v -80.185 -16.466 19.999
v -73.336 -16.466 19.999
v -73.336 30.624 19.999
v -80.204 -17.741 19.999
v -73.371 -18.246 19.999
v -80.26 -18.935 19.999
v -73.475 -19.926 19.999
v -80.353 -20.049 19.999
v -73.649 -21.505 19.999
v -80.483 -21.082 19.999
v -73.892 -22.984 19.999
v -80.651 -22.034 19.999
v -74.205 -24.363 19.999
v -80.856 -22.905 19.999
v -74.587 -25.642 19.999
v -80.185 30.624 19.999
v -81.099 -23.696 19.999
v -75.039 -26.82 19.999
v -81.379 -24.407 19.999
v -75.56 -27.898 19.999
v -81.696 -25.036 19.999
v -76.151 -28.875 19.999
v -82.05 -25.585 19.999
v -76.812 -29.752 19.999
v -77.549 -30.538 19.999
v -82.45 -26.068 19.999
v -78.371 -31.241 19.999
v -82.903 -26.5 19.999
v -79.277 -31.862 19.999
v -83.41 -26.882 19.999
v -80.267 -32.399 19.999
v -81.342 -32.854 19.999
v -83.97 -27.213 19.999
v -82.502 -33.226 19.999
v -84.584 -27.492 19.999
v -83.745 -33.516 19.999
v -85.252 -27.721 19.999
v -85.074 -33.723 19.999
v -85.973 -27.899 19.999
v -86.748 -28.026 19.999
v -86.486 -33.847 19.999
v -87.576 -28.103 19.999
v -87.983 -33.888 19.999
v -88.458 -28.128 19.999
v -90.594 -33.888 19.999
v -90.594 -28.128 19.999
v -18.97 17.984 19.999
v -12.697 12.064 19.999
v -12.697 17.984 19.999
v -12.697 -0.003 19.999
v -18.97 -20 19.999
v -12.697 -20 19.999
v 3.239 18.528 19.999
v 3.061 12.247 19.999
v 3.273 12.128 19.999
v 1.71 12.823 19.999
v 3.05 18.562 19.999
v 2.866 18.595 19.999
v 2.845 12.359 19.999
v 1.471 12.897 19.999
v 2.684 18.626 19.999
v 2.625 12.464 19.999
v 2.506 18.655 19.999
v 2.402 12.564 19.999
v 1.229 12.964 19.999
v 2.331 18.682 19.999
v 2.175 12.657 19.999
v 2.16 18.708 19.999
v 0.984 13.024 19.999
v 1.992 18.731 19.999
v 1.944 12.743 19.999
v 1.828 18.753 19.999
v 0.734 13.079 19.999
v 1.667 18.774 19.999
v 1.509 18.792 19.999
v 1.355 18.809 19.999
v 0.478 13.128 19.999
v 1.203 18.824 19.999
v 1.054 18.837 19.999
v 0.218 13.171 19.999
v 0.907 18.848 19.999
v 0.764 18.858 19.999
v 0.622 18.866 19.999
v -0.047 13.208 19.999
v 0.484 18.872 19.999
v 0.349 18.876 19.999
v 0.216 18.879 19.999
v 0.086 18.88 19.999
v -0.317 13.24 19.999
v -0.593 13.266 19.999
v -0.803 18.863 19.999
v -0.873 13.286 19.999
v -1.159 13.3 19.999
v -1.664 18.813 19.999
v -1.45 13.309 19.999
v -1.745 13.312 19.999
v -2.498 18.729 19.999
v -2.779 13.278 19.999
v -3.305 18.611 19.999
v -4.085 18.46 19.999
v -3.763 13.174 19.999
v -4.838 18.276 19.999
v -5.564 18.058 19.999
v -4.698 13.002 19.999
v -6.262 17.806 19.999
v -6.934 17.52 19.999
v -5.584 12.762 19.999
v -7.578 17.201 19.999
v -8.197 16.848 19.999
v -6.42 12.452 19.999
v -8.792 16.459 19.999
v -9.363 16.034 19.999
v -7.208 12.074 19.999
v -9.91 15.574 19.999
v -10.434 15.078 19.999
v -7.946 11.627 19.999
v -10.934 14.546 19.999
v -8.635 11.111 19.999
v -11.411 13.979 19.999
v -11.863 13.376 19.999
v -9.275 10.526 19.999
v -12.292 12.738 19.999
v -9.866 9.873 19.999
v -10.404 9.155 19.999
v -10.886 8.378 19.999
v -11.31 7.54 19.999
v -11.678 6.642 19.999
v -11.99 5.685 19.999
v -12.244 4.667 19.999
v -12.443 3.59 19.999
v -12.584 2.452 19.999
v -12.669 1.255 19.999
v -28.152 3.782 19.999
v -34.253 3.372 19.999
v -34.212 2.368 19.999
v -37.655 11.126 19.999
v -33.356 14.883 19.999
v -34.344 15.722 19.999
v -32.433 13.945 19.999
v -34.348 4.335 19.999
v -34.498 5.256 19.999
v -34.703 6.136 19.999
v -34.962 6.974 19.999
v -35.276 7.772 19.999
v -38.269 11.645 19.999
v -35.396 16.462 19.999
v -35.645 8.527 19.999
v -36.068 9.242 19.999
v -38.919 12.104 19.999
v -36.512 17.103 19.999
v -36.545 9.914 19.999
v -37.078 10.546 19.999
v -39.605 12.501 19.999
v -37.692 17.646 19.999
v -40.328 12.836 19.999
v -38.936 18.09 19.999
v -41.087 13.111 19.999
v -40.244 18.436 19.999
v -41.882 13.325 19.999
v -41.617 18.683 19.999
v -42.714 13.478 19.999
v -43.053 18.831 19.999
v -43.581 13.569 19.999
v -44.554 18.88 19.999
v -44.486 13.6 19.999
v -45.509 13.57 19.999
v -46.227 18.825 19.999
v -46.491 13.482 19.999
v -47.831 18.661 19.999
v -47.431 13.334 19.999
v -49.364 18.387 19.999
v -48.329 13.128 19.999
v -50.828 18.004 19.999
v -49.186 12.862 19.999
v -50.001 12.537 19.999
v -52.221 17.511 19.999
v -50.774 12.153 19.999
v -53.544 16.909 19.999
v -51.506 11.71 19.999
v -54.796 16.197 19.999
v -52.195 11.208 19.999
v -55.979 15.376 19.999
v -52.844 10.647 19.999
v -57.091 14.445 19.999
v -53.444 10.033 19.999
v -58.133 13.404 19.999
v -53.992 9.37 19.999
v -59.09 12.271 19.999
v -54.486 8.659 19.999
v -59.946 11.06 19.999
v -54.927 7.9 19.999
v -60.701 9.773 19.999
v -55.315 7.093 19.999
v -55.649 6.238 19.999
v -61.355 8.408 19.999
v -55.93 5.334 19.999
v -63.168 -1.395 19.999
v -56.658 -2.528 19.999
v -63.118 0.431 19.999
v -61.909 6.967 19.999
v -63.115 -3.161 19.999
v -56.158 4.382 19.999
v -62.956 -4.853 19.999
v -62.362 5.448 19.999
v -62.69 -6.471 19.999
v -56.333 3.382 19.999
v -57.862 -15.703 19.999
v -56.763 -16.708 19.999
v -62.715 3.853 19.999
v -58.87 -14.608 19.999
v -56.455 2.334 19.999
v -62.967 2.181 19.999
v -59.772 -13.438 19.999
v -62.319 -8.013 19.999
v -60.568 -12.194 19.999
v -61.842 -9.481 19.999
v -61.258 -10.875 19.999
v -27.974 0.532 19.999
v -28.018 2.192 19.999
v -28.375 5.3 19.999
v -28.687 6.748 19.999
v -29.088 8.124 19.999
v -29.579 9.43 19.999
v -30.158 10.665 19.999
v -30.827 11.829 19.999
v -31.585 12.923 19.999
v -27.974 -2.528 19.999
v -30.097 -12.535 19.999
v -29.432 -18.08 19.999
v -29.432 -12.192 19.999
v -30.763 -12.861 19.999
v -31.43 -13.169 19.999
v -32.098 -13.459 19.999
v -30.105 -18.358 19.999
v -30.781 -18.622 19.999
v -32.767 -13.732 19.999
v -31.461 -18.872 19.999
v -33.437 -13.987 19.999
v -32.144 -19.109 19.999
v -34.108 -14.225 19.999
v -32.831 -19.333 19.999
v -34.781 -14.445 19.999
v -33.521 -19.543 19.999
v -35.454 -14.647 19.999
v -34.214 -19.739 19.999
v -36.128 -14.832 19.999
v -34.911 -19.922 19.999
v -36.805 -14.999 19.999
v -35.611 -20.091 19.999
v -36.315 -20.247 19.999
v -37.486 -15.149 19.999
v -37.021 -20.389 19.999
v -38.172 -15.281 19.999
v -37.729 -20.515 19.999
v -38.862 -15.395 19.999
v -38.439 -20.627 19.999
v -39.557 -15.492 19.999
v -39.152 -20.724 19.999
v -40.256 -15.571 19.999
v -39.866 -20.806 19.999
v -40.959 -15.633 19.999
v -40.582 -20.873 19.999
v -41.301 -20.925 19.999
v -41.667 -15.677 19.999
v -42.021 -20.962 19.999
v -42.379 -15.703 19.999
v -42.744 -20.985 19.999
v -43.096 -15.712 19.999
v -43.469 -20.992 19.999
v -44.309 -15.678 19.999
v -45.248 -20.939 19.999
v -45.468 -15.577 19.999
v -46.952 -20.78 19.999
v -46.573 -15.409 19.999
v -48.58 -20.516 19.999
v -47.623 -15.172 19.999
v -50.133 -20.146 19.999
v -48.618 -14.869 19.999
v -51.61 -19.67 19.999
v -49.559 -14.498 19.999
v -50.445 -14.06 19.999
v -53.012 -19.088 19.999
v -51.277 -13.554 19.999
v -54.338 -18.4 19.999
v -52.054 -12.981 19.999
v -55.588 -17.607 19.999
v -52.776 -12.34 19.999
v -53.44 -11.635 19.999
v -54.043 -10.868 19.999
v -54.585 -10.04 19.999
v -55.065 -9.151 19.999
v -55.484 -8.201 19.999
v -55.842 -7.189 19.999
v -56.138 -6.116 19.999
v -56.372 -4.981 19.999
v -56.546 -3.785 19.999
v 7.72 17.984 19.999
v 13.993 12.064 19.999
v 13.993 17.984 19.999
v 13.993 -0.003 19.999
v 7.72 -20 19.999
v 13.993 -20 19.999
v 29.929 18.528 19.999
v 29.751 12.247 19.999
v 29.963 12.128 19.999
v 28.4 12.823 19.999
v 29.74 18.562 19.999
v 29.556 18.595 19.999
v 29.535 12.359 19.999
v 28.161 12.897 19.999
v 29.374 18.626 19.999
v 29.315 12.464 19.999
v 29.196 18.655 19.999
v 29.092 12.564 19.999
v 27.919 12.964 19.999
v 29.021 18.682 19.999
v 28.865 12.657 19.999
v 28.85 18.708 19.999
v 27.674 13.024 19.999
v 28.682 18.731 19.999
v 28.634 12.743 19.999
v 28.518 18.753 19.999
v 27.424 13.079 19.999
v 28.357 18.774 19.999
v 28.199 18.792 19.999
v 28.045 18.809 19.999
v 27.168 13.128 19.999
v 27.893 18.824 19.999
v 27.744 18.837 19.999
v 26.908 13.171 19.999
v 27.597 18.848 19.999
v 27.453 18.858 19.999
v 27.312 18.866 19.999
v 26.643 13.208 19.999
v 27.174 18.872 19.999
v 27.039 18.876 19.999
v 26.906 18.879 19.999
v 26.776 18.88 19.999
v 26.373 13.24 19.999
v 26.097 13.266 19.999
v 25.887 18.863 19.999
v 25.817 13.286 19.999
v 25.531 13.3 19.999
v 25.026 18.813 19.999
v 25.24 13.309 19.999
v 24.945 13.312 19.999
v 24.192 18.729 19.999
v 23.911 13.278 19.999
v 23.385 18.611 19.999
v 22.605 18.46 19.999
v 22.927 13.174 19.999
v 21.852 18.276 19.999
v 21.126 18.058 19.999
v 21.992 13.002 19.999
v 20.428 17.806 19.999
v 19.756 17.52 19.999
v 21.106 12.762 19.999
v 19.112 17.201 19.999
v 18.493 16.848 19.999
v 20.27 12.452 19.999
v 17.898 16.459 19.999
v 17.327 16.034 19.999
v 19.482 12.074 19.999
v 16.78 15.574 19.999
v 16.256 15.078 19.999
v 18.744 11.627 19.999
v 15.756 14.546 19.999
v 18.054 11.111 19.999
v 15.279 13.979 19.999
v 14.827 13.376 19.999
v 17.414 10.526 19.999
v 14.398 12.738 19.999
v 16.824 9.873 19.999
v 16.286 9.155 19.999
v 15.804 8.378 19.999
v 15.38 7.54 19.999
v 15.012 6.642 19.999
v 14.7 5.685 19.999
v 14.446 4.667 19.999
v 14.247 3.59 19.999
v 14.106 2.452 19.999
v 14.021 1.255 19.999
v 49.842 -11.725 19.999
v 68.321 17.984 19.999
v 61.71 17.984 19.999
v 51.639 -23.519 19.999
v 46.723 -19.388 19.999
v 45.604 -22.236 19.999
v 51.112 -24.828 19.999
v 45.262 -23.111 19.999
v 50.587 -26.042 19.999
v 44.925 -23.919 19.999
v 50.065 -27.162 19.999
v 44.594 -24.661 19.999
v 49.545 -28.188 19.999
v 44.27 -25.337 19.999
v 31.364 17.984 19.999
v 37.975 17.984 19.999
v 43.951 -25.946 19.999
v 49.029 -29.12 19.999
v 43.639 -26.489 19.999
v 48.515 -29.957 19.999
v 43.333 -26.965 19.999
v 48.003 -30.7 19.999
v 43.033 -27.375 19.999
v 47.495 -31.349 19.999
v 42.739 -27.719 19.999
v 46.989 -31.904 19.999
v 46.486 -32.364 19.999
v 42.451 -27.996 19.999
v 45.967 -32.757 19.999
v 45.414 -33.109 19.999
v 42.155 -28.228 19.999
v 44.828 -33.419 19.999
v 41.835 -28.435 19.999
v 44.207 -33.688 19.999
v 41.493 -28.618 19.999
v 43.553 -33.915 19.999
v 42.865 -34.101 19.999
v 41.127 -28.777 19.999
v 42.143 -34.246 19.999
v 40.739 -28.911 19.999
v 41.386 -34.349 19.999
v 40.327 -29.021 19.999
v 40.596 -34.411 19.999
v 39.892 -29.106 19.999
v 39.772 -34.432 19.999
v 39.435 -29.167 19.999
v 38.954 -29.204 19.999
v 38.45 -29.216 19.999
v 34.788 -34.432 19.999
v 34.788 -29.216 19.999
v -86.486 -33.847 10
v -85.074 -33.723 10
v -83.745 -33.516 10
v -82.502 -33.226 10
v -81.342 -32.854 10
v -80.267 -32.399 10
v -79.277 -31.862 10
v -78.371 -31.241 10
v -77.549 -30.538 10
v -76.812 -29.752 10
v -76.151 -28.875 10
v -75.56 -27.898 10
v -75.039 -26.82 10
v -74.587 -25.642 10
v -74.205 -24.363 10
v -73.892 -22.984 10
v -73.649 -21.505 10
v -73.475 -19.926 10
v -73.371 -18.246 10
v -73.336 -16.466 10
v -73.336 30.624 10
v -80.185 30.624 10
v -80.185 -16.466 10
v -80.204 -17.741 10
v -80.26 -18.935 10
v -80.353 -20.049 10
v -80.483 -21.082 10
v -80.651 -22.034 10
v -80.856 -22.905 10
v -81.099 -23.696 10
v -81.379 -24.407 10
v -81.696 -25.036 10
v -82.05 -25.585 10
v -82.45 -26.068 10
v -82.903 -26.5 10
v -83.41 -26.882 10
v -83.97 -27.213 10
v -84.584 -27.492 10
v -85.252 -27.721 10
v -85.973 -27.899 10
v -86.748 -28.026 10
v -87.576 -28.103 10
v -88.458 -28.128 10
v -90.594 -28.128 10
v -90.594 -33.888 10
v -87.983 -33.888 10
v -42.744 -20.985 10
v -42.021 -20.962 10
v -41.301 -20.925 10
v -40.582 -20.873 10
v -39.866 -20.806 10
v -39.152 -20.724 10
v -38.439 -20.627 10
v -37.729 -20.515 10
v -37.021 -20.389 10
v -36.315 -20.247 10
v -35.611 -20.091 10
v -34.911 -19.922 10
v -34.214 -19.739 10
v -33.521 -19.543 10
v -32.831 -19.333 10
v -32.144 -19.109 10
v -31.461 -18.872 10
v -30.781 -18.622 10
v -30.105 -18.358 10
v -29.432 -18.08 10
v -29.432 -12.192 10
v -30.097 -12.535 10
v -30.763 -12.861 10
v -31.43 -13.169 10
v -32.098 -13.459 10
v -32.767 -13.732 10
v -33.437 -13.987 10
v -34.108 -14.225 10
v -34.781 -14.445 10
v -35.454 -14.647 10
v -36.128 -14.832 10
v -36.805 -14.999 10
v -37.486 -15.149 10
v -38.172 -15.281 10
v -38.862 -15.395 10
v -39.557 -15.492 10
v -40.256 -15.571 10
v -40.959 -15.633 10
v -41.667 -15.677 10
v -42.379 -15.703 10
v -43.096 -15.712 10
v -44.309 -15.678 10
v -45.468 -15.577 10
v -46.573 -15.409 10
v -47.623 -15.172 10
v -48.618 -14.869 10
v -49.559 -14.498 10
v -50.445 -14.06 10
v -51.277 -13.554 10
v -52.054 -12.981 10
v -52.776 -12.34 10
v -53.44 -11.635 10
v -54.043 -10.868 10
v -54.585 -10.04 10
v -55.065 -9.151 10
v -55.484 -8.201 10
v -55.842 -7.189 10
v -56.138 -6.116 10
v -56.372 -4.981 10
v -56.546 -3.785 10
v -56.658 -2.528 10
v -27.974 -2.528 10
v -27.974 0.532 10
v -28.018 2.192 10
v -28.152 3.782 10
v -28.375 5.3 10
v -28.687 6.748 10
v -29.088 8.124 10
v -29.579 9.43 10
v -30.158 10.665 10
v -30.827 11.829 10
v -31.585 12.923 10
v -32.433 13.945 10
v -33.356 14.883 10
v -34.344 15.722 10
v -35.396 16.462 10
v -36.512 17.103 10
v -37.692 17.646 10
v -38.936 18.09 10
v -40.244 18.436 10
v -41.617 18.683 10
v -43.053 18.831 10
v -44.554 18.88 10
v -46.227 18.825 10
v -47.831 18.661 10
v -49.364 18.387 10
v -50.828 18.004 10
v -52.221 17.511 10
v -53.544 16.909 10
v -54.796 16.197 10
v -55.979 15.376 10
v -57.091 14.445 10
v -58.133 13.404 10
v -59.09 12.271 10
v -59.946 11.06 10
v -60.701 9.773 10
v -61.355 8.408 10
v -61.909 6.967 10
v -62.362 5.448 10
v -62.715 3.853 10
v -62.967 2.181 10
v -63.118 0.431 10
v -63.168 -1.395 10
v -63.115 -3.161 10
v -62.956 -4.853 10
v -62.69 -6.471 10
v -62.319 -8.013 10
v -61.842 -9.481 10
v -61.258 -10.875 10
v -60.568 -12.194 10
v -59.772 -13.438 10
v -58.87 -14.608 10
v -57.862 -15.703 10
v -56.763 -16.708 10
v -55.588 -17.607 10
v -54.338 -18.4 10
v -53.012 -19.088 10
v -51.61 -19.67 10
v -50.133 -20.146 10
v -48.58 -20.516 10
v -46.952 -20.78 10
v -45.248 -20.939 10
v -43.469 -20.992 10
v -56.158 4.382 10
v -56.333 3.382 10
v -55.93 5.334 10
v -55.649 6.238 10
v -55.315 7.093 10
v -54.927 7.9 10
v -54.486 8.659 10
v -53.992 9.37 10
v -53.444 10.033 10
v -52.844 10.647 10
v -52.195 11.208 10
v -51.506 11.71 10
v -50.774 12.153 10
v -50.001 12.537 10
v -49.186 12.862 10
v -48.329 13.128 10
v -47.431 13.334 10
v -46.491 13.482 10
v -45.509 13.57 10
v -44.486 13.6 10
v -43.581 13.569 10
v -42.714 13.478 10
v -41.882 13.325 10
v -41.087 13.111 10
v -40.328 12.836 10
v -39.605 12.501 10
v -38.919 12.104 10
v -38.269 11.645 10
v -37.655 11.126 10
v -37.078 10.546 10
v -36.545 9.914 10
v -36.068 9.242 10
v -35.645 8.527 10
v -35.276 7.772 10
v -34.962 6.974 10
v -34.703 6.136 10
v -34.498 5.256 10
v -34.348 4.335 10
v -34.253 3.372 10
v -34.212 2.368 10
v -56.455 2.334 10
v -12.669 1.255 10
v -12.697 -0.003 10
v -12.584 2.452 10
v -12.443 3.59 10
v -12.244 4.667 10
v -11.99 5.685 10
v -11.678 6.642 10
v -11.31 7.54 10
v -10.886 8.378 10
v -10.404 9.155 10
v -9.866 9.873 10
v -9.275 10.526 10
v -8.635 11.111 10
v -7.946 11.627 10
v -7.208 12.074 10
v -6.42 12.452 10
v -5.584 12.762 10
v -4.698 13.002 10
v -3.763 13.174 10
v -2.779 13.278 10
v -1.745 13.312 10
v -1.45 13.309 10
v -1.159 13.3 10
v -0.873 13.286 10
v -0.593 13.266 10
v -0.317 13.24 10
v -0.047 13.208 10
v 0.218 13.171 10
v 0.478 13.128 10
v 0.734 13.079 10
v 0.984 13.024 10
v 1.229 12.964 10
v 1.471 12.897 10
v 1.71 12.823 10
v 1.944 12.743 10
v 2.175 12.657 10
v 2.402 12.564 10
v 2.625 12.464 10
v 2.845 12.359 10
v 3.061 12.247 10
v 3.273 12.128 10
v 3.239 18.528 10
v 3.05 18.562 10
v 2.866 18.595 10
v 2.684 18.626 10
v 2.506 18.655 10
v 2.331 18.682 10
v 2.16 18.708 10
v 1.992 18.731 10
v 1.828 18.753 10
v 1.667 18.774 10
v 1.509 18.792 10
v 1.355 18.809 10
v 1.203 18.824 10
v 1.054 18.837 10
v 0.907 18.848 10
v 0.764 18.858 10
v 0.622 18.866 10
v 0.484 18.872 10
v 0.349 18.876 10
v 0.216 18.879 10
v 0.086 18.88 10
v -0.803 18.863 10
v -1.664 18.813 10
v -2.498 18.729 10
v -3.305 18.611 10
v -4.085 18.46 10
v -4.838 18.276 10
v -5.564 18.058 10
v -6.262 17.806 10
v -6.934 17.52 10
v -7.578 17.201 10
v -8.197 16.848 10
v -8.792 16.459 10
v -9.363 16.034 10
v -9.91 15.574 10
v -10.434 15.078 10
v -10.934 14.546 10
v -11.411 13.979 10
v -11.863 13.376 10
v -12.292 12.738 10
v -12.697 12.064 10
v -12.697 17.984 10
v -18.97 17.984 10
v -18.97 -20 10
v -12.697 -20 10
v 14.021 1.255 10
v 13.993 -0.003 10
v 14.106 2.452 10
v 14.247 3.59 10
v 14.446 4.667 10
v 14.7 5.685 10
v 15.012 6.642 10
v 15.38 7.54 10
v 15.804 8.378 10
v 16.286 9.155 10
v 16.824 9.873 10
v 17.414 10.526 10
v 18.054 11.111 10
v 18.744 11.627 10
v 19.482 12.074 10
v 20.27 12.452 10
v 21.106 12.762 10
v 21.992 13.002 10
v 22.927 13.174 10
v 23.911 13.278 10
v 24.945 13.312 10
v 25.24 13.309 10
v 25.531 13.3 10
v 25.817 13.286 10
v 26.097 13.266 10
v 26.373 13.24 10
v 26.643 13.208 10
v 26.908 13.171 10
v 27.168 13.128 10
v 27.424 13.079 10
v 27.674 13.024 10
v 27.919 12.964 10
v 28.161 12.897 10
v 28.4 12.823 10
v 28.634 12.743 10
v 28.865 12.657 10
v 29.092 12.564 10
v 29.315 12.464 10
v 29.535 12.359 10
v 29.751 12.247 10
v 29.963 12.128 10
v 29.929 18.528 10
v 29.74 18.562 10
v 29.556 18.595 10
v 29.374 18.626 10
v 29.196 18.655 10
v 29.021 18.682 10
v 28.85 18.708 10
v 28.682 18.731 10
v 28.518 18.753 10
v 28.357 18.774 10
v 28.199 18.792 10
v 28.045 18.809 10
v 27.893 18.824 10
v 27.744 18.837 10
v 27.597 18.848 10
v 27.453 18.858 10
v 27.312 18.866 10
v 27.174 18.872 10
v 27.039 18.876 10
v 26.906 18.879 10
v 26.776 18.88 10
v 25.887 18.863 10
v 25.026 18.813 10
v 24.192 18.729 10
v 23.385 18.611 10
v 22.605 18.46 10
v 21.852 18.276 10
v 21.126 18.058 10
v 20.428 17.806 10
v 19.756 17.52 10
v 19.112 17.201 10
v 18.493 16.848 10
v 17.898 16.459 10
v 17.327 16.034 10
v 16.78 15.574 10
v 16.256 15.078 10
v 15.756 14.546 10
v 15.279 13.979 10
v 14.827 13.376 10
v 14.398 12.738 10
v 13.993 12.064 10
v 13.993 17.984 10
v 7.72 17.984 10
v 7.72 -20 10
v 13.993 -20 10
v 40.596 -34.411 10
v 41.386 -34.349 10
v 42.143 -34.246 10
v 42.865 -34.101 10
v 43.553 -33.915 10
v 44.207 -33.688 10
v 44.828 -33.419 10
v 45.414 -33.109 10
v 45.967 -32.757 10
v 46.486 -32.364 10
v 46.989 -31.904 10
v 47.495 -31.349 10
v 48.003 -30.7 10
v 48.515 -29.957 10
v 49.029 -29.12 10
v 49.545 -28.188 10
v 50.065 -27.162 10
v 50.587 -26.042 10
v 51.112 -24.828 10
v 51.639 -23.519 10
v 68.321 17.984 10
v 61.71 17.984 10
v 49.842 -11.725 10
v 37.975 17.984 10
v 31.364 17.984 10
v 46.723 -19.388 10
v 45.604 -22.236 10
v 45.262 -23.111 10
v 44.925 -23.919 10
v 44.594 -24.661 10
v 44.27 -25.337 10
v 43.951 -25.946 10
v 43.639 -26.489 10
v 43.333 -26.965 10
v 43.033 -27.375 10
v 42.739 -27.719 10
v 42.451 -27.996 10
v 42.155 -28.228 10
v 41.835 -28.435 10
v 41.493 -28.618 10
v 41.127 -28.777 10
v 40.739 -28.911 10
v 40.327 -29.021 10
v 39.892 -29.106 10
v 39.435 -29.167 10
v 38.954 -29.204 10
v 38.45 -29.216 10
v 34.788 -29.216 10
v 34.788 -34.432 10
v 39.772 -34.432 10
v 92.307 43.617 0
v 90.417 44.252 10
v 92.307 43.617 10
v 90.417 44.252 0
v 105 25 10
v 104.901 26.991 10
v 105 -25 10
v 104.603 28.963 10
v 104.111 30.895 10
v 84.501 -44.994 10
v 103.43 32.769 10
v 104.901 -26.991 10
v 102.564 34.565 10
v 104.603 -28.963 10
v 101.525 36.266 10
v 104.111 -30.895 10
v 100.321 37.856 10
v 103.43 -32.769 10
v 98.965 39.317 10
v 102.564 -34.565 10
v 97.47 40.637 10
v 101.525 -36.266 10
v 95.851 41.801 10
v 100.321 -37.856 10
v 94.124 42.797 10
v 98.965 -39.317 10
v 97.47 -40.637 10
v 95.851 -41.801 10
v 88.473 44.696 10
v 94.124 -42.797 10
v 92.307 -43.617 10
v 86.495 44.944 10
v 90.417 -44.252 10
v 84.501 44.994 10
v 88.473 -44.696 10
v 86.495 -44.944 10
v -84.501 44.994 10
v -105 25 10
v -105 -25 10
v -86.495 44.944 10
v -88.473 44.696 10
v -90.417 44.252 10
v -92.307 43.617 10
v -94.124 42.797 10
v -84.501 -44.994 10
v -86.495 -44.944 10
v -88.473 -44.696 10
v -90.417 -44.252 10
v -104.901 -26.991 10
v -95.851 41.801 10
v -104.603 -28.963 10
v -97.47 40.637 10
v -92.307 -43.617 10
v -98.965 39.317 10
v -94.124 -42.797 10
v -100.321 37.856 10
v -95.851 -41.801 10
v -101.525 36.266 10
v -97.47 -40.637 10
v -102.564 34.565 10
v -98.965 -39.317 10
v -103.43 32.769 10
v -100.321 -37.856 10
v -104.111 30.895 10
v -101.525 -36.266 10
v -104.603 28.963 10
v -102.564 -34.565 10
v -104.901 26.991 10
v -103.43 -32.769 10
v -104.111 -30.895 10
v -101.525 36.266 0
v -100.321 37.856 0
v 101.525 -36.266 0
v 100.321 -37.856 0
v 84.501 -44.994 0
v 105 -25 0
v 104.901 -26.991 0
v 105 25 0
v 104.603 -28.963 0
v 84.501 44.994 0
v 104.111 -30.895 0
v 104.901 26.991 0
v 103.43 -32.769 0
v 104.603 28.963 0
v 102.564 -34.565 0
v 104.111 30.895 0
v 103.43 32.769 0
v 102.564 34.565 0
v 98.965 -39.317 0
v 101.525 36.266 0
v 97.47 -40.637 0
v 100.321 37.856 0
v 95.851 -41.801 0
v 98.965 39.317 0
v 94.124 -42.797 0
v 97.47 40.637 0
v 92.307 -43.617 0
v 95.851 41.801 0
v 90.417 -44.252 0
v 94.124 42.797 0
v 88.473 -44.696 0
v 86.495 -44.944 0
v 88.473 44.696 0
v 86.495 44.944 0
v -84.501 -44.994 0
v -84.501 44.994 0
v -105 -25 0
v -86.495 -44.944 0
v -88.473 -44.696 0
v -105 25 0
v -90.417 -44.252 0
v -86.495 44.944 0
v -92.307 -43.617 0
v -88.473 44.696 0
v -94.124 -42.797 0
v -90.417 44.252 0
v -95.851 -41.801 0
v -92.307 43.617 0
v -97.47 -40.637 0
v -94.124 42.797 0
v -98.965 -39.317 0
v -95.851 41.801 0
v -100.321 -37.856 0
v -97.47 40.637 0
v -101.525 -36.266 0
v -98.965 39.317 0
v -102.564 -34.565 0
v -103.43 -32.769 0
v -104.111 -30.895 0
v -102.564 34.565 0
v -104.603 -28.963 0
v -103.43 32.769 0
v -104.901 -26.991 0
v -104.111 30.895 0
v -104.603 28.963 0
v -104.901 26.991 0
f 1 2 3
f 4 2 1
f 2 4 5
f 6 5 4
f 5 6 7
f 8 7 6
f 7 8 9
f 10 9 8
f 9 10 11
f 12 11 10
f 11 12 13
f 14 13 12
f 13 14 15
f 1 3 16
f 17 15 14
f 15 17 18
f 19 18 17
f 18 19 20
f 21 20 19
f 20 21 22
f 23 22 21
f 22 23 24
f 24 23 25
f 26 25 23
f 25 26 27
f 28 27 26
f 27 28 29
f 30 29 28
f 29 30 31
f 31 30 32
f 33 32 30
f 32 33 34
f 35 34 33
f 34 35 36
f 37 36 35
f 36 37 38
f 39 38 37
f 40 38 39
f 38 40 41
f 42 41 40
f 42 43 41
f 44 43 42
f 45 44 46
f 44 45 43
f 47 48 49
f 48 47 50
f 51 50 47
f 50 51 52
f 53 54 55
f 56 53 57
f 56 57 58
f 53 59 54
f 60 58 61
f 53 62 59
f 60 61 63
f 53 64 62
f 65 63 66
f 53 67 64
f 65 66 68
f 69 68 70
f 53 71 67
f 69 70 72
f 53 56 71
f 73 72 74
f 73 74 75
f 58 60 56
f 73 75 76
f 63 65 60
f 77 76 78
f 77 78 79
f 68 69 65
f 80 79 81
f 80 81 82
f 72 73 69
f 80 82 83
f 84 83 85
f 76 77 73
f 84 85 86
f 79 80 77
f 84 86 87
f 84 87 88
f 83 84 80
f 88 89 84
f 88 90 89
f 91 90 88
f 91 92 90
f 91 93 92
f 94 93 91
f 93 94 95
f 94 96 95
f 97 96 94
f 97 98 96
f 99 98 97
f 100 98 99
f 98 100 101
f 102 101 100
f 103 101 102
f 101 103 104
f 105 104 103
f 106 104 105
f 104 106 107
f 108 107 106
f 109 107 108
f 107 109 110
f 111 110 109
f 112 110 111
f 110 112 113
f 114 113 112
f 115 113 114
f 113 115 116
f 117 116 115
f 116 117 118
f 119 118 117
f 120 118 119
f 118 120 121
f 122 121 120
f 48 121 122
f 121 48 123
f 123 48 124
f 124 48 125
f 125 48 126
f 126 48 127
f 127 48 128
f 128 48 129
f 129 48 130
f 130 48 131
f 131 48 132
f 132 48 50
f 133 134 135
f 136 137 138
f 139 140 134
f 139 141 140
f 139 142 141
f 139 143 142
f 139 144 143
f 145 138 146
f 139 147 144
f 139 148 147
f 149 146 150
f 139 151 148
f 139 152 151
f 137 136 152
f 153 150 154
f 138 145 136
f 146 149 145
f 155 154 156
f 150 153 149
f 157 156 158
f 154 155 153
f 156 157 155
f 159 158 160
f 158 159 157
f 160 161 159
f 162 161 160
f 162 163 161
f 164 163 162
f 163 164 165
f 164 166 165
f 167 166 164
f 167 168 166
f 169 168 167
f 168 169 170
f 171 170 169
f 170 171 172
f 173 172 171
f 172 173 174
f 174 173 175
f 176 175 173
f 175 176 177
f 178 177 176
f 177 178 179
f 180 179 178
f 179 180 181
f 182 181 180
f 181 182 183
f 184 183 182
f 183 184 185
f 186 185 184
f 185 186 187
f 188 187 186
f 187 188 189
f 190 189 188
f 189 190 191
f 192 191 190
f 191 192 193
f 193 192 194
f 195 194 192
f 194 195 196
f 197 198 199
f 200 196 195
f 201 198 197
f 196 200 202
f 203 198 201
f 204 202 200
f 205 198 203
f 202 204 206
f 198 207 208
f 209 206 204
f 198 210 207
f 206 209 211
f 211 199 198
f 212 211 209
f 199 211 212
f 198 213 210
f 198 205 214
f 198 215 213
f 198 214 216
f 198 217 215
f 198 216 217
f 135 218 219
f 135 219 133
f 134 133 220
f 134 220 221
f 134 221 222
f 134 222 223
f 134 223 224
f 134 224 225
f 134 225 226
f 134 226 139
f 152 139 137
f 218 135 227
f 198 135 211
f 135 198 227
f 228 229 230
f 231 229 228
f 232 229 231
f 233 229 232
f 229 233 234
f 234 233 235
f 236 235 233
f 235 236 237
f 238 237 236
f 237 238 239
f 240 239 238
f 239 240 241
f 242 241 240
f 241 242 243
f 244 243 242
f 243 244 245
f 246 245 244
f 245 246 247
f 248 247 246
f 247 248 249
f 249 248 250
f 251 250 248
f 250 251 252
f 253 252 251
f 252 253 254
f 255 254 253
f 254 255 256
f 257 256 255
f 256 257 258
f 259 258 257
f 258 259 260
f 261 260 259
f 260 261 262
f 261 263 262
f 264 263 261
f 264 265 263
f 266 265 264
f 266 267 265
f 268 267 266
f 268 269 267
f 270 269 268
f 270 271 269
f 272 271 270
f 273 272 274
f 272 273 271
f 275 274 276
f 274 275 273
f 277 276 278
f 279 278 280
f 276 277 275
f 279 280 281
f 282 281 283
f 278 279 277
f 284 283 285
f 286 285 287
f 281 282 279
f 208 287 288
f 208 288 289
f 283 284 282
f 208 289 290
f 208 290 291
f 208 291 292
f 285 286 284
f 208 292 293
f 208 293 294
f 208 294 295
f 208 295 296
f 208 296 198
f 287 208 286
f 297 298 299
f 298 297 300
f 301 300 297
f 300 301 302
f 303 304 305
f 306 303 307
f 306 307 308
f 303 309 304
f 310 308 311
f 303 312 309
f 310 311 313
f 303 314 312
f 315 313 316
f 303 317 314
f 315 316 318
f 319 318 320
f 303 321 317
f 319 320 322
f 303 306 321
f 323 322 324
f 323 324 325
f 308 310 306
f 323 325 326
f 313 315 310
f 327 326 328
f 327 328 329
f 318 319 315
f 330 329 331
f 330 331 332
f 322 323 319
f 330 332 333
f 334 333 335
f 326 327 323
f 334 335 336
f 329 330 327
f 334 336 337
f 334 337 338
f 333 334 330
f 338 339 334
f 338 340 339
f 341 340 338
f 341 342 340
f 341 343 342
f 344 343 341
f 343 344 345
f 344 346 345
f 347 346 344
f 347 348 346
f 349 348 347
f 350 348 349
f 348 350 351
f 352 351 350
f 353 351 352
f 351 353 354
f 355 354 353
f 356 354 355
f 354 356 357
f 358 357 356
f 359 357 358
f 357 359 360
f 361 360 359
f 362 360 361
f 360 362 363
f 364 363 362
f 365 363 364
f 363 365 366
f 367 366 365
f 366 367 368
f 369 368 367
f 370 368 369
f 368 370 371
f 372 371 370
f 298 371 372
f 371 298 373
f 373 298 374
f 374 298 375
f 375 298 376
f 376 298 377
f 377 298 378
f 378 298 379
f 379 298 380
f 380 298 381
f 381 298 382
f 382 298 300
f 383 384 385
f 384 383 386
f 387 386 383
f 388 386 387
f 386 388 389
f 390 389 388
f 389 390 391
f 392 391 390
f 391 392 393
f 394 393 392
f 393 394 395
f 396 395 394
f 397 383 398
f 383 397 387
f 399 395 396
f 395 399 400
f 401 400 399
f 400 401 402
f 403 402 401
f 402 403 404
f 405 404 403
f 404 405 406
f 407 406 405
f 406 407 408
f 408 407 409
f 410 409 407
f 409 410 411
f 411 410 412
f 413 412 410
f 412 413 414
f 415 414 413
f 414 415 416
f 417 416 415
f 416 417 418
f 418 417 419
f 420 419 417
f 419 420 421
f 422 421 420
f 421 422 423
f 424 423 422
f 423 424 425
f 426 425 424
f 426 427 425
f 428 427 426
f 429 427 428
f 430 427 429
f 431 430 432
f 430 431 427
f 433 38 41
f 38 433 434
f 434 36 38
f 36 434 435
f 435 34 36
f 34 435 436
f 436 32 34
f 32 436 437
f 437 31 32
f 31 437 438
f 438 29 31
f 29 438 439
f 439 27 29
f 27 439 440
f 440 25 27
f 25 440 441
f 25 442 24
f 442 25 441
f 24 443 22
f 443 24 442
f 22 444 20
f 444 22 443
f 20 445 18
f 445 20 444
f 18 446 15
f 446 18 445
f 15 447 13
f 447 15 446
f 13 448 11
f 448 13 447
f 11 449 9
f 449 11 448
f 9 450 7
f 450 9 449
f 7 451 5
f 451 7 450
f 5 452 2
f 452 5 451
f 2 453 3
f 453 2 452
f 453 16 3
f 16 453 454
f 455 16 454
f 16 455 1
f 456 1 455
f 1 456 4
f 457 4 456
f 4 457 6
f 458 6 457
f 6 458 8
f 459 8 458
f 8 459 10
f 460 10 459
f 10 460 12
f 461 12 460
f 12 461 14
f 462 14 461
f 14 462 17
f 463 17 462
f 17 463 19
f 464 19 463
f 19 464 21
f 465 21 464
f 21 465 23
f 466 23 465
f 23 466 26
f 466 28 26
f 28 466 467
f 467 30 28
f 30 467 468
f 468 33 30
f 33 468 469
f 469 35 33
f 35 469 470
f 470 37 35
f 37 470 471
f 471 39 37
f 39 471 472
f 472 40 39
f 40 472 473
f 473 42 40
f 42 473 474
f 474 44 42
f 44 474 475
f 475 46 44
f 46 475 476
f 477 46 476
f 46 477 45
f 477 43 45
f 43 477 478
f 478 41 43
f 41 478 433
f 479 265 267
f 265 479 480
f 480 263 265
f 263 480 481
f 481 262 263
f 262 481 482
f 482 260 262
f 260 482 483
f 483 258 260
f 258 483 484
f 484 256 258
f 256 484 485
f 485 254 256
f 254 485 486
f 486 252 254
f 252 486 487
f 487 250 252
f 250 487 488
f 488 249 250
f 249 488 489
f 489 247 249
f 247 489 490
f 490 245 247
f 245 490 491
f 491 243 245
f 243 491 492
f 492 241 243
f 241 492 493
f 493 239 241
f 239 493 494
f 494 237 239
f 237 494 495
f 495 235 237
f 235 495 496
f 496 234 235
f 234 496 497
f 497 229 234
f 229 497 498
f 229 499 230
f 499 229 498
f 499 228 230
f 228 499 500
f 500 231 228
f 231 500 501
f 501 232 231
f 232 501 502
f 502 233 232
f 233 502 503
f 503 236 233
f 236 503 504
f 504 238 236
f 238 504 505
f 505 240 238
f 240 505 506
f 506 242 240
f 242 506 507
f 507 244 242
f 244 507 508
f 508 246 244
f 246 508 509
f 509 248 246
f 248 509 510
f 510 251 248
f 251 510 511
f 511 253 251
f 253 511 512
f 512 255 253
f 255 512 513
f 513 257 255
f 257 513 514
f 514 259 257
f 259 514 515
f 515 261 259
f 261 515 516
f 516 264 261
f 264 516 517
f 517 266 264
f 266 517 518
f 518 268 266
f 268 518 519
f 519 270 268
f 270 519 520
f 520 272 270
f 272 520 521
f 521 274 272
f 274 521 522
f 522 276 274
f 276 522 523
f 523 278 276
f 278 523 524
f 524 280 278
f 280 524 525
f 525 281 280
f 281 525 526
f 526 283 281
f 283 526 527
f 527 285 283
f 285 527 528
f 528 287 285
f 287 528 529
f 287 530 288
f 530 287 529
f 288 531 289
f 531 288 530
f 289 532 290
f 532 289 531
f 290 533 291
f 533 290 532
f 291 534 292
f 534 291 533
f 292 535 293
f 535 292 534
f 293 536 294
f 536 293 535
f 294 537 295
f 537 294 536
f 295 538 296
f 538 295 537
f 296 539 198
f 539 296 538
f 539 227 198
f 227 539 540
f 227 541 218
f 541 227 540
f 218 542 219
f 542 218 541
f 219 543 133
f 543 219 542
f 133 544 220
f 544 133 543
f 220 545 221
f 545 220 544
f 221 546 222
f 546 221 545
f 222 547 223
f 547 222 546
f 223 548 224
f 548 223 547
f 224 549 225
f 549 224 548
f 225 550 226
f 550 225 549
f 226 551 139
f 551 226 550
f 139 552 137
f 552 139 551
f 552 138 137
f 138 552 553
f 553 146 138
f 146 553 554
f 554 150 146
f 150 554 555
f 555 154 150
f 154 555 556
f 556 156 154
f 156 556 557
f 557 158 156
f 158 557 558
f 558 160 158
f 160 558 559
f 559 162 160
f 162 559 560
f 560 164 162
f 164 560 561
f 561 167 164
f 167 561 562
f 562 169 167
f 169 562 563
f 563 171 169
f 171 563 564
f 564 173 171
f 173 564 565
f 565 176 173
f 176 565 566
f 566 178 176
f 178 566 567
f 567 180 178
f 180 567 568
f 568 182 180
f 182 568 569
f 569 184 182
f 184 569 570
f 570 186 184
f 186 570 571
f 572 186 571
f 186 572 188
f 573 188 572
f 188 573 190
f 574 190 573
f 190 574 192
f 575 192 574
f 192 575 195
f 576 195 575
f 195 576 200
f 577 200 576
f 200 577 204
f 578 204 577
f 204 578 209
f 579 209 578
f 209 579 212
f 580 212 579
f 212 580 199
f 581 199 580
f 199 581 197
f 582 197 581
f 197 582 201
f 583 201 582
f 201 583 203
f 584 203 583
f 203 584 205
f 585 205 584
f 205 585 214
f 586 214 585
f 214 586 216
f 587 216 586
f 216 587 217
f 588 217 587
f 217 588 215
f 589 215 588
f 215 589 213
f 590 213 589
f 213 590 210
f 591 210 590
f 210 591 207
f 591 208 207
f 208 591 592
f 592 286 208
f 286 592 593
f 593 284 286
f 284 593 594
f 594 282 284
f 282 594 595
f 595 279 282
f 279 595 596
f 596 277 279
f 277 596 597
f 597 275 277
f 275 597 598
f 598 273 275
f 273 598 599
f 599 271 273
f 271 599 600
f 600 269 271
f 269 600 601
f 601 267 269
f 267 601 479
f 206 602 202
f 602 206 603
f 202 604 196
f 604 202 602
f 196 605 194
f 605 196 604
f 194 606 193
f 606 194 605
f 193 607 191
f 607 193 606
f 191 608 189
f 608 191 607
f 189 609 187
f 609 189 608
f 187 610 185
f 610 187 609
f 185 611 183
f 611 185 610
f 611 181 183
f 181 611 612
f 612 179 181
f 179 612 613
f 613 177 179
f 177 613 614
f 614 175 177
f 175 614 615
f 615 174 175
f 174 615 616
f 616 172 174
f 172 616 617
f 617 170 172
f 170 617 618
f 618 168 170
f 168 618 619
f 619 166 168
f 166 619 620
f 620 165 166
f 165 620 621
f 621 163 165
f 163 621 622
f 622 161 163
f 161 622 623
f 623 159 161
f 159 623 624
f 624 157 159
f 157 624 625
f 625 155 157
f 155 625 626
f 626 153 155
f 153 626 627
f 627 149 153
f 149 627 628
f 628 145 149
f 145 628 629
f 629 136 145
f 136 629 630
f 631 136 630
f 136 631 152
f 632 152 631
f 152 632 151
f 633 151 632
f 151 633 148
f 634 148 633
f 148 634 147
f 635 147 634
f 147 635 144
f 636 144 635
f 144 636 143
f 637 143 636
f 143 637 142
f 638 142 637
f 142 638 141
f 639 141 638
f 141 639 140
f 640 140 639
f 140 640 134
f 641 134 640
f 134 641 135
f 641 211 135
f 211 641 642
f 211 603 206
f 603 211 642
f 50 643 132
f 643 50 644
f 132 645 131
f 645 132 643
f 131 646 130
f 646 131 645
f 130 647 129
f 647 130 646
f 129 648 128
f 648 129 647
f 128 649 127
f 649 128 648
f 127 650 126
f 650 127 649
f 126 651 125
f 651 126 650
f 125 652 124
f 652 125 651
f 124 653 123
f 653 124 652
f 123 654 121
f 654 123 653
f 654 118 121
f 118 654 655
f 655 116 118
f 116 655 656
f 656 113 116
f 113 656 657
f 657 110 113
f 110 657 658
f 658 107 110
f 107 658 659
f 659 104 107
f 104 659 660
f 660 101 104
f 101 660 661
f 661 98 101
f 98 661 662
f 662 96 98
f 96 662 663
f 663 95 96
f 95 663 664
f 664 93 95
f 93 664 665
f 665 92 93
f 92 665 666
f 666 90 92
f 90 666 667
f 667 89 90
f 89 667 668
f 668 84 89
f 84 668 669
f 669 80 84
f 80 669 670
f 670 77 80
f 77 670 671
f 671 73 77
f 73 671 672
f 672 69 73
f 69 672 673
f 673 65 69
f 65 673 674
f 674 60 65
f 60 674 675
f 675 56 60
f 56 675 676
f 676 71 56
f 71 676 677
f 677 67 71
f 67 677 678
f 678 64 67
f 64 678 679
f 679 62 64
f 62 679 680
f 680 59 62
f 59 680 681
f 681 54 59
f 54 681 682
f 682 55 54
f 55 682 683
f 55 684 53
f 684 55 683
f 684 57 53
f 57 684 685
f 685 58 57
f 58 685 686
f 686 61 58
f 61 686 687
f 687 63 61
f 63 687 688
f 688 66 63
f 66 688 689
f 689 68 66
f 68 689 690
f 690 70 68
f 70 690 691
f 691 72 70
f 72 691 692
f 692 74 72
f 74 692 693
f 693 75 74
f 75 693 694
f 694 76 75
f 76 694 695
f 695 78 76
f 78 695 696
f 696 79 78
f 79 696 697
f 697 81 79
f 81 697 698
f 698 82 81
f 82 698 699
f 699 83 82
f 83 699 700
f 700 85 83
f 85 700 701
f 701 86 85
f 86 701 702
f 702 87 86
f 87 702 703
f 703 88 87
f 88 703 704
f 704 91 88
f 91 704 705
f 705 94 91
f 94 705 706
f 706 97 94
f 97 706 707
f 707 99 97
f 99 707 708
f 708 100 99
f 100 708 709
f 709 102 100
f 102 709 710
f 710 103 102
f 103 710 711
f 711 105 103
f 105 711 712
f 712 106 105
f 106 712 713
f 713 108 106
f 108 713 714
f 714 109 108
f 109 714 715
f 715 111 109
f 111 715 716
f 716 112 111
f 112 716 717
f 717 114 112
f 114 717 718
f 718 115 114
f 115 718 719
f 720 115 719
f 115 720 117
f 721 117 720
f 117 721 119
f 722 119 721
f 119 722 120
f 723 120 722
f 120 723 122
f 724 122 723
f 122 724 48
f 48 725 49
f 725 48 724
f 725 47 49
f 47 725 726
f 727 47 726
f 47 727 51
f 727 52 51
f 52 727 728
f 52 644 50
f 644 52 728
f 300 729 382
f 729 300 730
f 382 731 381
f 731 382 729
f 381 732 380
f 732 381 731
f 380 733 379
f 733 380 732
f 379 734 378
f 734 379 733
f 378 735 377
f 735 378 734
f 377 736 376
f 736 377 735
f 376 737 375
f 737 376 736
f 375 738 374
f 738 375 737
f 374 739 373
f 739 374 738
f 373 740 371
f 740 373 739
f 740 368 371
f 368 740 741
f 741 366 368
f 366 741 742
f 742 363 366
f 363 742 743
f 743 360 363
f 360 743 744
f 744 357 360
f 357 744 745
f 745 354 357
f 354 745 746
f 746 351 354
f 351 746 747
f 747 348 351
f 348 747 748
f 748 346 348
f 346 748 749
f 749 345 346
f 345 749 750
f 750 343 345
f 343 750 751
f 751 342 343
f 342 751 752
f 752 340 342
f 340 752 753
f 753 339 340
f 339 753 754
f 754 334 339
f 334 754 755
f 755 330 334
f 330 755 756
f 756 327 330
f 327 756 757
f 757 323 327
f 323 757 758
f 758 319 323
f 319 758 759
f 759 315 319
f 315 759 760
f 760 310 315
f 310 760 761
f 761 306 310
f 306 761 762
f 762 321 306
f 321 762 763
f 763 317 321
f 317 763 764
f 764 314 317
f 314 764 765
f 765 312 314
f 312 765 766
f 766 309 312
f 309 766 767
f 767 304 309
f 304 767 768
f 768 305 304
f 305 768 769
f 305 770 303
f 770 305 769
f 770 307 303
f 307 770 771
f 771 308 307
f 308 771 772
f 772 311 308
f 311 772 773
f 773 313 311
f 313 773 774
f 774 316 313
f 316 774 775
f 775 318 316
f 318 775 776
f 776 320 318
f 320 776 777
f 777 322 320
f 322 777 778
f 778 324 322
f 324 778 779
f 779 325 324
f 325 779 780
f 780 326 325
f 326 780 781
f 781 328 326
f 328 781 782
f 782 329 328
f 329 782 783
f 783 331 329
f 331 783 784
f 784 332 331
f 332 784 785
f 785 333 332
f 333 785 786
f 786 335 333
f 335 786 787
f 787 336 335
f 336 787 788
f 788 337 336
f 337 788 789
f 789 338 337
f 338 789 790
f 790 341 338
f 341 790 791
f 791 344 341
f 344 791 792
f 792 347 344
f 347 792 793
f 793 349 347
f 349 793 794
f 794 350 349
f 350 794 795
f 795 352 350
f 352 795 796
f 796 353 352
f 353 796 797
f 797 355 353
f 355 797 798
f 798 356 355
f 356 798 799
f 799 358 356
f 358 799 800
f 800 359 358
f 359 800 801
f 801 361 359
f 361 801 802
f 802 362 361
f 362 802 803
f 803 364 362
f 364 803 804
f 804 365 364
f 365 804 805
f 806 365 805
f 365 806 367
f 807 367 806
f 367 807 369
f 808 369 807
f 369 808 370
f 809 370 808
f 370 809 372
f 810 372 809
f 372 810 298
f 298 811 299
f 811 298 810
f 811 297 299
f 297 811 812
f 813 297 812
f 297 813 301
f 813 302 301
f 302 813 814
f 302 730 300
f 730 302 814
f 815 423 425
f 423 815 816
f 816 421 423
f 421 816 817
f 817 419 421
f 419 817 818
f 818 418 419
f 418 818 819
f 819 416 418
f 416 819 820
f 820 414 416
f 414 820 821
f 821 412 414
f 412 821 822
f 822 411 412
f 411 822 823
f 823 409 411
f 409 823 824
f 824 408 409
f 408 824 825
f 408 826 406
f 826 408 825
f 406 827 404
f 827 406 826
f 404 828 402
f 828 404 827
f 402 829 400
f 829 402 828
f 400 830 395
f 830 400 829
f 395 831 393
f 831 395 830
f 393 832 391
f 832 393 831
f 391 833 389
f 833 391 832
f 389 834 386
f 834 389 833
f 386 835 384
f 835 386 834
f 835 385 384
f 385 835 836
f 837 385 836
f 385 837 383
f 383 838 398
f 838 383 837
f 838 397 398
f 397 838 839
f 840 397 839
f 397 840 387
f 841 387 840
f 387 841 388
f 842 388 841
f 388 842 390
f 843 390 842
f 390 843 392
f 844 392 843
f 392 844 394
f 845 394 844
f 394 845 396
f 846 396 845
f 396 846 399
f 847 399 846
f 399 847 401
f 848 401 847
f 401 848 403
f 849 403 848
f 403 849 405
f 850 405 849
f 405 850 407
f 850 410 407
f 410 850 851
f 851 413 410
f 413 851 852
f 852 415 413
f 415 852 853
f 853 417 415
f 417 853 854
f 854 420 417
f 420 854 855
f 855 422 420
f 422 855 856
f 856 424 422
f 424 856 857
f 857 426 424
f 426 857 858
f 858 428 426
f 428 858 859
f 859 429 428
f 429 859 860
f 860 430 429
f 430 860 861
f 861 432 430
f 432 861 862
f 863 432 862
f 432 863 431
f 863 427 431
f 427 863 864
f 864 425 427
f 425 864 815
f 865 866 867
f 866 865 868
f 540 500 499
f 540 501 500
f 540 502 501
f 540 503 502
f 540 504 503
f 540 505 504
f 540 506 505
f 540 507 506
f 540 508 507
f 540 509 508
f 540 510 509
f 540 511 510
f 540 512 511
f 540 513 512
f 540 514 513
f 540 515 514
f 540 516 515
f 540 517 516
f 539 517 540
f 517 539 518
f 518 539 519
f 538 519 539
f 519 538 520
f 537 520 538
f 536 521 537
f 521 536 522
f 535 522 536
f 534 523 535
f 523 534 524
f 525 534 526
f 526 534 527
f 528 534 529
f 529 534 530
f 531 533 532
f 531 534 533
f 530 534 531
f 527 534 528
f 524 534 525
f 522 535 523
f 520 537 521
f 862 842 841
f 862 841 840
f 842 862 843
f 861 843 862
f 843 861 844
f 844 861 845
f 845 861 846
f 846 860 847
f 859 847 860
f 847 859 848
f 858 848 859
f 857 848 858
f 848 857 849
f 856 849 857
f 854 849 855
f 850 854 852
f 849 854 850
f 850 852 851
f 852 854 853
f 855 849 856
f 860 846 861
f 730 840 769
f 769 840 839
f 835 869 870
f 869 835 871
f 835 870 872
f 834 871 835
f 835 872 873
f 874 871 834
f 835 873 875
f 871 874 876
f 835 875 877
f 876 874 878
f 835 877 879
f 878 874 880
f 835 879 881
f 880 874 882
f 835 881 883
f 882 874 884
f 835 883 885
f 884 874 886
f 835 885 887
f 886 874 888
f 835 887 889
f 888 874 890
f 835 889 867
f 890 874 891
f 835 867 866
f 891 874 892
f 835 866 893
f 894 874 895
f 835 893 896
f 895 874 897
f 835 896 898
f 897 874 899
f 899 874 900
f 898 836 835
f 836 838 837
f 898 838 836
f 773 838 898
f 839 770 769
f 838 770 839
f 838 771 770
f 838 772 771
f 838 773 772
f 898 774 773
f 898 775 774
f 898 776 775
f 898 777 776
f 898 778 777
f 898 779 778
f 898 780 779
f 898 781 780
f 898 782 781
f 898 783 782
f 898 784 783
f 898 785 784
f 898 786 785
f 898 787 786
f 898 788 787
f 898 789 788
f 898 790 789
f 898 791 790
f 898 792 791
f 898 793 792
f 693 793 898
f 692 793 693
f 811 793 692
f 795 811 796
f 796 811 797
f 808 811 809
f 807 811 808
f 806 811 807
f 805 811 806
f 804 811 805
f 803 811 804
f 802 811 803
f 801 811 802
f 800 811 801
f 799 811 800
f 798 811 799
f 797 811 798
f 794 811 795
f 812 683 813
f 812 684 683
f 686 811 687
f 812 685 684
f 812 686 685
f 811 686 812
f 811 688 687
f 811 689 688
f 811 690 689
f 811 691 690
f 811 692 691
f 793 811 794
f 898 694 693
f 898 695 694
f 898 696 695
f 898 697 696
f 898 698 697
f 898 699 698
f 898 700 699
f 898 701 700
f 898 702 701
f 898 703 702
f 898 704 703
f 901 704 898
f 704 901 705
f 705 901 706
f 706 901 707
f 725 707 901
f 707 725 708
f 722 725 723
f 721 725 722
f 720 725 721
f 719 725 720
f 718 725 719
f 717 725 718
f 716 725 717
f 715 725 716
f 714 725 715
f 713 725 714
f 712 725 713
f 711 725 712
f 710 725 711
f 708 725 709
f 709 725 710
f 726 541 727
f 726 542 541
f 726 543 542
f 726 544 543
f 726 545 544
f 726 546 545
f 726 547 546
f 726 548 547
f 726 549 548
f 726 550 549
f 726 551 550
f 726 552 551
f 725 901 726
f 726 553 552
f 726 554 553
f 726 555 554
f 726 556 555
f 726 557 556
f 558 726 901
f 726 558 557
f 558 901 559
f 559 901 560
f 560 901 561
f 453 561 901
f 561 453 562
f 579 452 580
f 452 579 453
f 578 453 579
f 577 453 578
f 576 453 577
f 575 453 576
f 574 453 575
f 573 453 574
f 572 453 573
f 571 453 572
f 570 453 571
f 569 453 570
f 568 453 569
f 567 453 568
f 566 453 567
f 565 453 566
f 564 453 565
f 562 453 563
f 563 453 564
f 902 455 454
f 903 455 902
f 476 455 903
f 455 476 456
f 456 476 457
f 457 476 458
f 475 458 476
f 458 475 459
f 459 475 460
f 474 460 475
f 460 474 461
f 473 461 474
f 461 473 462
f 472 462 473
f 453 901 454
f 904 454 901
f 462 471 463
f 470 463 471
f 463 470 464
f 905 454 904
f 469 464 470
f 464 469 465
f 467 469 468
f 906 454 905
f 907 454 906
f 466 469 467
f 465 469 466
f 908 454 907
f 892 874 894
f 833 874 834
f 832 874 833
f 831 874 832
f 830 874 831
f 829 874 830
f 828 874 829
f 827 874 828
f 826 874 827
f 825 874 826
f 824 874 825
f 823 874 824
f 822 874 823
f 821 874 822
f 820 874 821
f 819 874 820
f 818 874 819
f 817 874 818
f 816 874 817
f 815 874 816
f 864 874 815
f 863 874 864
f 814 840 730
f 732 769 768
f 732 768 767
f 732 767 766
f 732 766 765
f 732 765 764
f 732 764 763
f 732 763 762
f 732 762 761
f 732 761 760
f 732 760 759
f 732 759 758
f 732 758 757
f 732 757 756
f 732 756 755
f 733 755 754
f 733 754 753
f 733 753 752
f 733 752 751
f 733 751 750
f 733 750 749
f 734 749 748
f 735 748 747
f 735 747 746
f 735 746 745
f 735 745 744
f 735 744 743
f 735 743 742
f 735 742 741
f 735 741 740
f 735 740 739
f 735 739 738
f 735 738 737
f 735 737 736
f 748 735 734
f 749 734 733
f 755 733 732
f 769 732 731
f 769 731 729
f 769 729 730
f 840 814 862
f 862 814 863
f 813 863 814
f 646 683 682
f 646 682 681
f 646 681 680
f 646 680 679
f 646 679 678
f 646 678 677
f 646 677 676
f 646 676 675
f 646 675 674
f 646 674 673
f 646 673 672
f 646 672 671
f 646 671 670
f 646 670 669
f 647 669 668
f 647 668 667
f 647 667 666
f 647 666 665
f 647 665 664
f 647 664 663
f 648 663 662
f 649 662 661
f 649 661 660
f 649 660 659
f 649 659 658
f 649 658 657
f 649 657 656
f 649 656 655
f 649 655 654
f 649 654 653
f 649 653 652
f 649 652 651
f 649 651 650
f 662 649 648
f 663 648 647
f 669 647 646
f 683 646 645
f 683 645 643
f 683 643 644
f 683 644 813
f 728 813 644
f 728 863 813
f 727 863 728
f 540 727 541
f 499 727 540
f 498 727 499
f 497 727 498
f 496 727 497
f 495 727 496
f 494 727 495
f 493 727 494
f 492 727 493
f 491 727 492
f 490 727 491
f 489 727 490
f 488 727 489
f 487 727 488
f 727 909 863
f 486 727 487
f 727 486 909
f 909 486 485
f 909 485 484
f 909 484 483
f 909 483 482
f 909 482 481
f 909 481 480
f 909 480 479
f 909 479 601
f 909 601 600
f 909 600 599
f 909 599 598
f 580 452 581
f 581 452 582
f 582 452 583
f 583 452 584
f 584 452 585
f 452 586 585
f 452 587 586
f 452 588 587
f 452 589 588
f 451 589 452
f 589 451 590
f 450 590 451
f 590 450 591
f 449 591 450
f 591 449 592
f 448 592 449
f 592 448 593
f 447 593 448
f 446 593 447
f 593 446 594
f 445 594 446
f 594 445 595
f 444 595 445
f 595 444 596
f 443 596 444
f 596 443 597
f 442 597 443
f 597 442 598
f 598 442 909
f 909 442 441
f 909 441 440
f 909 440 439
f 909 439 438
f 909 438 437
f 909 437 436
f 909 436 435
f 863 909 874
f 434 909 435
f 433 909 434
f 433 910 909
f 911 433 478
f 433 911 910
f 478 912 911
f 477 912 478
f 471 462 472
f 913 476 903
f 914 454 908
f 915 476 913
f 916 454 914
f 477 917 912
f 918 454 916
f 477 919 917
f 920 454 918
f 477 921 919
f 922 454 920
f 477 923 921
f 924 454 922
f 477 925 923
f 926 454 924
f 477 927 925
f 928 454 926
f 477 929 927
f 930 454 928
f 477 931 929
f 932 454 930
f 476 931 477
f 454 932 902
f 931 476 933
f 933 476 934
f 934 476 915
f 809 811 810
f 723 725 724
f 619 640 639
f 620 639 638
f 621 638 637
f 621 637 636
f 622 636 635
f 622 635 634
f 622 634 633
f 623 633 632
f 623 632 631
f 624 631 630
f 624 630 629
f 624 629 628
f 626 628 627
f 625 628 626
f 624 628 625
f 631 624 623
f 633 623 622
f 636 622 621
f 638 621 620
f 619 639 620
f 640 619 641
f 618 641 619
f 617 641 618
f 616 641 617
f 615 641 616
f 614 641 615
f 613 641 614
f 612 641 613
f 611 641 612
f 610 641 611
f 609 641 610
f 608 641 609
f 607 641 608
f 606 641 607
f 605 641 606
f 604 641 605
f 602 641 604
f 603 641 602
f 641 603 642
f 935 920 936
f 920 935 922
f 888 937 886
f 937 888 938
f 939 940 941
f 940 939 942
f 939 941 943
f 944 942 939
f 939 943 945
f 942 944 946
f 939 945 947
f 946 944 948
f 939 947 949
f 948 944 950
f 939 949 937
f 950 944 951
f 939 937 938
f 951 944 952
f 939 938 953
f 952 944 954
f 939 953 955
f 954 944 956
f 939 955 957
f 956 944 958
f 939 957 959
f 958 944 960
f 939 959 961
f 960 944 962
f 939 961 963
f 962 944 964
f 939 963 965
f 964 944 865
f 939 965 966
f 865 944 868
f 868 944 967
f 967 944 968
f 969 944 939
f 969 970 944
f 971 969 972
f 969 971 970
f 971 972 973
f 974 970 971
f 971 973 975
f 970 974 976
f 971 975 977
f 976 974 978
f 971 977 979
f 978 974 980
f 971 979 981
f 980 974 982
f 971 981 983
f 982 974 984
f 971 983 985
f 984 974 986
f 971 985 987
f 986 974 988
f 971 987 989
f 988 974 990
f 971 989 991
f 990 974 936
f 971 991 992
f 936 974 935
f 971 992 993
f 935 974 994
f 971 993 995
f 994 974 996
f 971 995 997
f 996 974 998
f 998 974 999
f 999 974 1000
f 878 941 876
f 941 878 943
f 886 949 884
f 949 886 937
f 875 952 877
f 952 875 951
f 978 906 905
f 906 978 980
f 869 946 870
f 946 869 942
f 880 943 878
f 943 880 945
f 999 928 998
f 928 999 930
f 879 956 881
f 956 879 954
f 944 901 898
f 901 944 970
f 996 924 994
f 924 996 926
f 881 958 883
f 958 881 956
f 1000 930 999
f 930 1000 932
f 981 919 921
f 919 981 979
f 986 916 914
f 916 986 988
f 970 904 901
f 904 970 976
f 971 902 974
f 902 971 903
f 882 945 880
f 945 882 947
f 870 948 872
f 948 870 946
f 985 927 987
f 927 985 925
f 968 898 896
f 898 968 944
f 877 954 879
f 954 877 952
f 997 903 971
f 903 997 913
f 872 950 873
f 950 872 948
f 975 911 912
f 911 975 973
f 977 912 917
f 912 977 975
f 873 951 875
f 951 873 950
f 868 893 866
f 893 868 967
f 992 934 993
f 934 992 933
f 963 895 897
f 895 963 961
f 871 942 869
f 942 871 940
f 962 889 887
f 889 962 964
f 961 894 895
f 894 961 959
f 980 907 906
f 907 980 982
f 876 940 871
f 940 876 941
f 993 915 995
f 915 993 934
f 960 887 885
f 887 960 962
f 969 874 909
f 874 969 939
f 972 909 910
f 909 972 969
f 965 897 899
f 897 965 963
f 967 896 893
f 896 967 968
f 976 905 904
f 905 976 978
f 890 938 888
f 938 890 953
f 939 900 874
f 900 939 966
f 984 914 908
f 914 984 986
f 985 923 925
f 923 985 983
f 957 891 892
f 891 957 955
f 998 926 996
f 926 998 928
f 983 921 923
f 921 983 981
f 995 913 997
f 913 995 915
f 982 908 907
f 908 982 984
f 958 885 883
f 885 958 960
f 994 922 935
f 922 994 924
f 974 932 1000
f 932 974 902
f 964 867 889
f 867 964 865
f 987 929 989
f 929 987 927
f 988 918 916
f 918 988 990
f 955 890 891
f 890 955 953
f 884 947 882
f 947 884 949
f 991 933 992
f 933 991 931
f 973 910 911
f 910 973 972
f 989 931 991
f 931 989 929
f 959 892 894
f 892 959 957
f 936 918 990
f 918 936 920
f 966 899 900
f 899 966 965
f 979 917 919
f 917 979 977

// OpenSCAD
translate([-87, -20, 9.999])
  linear_extrude(10)
    text("Jerry", 50, "Bookman");
    
color("red")
  hull()
    for (a = [-1, 1], b = [-1, 1])
      scale([a, b, 1])
        translate([85, 25, 0])
          cylinder(10, 20, 20);
    
$fa = 5;
